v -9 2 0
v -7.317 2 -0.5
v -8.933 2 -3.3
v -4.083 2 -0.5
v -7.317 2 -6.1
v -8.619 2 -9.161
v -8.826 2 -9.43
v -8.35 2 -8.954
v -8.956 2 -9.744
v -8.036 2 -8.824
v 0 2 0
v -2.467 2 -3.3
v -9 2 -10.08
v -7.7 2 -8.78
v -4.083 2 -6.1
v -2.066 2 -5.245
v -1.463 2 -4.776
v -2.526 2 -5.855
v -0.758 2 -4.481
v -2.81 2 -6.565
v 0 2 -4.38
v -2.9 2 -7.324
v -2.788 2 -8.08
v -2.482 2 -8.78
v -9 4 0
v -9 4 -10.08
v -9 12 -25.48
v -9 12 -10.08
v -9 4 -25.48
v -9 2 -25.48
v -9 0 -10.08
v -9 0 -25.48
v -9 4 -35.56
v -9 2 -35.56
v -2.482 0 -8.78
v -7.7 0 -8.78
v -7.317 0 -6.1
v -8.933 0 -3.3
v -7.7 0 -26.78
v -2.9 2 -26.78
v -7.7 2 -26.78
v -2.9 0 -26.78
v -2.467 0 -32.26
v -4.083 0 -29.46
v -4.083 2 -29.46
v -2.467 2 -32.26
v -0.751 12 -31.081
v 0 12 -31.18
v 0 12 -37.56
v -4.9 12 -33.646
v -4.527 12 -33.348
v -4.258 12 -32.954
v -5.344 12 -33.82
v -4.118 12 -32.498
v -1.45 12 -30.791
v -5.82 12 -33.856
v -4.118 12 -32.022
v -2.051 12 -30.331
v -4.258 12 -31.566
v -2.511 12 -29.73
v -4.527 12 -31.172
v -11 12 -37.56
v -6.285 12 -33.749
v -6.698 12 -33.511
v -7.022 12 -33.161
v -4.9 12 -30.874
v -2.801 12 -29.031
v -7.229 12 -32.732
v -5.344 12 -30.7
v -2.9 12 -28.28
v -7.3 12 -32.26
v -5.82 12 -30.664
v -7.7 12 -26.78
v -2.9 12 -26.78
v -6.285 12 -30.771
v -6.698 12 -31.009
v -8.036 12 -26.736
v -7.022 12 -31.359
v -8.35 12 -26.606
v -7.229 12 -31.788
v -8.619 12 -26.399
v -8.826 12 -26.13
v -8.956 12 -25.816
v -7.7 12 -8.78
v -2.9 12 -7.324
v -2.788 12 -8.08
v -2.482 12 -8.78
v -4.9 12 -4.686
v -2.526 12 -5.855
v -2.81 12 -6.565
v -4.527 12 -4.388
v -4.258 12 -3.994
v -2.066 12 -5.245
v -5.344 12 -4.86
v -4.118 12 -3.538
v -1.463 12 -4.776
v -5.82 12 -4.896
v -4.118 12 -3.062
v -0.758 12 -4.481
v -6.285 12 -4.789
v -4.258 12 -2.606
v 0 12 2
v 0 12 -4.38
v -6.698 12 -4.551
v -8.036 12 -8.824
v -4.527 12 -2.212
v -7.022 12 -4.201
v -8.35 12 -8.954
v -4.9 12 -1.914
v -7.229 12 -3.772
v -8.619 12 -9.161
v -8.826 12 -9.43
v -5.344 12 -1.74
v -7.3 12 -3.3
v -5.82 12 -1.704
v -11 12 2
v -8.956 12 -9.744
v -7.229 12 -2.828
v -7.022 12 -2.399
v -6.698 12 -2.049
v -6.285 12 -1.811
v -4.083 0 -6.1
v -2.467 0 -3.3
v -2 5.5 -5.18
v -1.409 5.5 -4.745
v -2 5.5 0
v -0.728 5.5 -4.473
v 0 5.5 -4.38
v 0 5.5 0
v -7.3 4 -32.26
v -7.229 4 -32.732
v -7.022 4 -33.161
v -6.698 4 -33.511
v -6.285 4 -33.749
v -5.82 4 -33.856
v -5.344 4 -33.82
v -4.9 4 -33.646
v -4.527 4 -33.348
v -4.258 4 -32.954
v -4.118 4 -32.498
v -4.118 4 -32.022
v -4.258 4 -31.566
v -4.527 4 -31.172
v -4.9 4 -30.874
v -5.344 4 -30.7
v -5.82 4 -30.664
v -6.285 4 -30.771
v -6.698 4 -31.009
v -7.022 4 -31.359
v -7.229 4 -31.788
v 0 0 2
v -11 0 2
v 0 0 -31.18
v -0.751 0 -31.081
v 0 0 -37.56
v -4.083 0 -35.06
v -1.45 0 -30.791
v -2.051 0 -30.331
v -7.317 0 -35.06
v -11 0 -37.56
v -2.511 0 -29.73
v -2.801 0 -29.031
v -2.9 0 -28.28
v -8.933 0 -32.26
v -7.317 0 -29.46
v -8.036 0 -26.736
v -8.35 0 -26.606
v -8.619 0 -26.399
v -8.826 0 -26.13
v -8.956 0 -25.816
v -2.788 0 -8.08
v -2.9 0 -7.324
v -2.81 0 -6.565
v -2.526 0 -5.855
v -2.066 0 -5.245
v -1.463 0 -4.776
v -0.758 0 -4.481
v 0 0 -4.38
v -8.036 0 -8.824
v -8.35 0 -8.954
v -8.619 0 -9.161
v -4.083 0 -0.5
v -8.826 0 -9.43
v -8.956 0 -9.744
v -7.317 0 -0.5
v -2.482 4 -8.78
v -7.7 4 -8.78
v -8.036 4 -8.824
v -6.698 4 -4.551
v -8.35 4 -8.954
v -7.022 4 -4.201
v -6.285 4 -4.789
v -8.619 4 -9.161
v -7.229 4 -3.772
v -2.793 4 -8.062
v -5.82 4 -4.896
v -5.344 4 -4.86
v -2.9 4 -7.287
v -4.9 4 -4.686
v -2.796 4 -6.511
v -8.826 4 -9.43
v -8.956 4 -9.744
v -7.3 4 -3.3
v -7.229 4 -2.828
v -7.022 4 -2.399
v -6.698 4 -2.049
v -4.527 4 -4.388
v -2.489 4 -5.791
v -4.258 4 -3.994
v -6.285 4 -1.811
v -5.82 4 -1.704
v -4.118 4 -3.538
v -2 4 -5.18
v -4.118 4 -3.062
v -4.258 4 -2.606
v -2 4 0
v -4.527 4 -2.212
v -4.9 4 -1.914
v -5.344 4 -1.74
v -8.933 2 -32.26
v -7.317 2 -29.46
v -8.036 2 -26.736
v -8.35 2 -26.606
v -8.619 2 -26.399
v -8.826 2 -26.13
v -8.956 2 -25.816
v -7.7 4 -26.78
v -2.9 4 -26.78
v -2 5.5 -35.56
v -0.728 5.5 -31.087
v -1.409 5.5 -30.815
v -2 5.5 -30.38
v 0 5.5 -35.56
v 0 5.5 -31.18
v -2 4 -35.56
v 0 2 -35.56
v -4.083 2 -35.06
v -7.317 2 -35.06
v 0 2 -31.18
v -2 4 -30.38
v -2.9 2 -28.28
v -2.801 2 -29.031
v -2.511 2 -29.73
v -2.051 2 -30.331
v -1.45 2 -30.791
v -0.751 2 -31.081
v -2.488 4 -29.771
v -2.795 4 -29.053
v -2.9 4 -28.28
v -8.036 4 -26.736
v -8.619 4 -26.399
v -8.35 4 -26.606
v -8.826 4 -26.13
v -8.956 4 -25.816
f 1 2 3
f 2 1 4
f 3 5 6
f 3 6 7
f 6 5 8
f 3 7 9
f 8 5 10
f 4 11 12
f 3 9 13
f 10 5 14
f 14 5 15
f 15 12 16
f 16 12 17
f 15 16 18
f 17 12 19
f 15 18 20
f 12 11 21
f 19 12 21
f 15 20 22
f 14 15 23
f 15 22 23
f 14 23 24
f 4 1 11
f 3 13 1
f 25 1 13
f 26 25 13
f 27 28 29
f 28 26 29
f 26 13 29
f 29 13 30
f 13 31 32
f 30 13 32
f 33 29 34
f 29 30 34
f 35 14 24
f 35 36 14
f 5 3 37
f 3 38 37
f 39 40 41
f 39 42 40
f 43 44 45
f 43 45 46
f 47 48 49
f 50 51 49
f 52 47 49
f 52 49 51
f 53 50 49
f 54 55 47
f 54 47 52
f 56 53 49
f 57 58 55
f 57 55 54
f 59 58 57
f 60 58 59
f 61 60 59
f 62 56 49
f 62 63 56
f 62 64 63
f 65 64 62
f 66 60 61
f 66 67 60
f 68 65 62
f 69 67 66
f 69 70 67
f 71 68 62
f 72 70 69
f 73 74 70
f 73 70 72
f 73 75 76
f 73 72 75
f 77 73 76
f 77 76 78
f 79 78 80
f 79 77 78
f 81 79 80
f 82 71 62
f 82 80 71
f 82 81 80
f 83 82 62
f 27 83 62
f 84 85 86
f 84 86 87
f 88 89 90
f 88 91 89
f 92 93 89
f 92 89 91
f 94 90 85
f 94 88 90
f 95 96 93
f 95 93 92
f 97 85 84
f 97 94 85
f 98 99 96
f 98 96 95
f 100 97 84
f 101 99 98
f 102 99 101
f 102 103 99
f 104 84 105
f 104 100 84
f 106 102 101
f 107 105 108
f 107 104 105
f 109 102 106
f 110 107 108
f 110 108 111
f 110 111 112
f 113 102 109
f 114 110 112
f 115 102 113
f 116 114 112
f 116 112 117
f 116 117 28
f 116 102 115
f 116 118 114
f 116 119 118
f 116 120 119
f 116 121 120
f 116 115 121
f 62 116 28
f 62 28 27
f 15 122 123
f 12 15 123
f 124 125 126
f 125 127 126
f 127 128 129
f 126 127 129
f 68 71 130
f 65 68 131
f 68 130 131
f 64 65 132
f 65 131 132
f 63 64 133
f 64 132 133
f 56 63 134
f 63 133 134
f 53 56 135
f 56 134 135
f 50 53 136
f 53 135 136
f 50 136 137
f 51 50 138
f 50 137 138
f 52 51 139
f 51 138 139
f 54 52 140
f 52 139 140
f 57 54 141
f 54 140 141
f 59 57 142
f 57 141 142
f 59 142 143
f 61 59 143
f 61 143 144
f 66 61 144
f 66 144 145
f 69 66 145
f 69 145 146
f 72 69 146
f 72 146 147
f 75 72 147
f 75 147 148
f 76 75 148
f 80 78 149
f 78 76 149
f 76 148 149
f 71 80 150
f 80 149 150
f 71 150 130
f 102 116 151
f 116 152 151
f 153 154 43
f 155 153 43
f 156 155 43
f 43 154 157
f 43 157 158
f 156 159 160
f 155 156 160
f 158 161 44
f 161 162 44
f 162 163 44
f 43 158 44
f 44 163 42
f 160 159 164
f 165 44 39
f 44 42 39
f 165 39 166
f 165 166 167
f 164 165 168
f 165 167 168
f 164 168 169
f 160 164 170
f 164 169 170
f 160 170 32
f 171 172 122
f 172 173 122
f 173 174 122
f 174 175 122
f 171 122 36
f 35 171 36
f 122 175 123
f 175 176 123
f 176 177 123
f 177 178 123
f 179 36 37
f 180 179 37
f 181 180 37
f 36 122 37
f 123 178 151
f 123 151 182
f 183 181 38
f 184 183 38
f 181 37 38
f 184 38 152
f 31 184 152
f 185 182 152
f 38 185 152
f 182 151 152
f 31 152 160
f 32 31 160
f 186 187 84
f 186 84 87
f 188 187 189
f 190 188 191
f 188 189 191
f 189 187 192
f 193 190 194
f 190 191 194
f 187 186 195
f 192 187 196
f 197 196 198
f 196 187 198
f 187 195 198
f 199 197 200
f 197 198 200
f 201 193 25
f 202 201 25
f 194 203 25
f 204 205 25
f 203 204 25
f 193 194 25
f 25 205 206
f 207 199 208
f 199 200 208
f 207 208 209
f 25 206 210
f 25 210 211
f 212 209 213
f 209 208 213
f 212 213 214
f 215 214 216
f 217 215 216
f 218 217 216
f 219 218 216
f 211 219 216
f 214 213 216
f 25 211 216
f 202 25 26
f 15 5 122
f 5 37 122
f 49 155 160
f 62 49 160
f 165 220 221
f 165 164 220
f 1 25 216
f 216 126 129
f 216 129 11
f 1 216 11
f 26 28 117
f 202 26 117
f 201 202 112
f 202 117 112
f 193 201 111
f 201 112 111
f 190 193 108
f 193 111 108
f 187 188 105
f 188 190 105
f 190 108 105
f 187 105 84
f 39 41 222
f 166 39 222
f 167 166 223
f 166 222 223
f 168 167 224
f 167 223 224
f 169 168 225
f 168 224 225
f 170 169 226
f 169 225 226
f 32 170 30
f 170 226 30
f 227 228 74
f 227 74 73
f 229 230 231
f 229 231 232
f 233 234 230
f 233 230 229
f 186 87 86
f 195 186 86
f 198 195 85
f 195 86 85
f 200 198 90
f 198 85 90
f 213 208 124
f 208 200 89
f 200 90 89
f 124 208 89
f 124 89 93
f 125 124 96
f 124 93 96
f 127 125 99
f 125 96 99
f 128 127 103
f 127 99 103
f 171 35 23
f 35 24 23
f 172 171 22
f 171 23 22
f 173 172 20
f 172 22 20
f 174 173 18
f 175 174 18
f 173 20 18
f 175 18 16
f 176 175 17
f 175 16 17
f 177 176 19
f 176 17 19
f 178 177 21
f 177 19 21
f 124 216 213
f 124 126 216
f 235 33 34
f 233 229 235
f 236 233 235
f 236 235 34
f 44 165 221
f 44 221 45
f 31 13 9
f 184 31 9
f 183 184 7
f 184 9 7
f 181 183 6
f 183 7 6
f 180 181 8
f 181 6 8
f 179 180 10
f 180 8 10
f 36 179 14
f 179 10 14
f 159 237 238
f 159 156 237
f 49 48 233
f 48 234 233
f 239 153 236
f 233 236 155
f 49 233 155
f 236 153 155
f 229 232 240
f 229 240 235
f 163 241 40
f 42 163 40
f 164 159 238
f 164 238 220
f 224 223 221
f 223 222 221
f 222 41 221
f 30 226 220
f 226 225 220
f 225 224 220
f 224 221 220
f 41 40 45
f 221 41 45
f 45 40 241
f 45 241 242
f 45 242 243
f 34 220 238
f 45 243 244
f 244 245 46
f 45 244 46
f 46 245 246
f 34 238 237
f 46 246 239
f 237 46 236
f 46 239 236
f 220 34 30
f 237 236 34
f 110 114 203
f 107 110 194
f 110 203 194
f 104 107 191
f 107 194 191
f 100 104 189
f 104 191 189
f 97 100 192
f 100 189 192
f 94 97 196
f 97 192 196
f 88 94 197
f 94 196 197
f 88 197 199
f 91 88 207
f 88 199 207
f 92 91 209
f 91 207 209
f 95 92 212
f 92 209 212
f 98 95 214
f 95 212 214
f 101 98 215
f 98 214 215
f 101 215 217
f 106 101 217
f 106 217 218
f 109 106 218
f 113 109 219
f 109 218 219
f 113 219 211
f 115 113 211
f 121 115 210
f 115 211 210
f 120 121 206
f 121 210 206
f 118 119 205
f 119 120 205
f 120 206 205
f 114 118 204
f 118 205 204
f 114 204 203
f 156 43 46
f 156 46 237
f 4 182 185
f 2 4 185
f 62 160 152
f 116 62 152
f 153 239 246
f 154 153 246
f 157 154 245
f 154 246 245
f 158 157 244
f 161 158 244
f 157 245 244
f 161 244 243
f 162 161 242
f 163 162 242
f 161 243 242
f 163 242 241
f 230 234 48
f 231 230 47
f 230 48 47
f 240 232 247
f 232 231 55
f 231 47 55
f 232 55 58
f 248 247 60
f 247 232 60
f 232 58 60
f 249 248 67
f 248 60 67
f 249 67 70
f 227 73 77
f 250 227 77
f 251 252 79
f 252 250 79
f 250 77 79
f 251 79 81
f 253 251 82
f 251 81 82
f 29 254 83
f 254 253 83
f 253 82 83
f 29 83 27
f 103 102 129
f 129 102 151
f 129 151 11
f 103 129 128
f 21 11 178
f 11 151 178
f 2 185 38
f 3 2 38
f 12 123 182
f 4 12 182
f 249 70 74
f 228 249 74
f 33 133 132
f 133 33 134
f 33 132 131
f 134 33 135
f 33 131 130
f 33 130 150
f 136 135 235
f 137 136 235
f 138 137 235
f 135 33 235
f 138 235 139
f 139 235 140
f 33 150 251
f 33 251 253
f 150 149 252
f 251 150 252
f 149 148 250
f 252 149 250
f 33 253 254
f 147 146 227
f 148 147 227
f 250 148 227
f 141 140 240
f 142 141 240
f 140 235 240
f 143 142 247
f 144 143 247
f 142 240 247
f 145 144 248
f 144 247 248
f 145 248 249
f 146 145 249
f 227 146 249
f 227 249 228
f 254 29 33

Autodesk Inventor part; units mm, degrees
ref_plane "YZ Plane" through (0, 0, 0) normal (1, 0, 0) x (0, 1, 0)
ref_plane "XZ Plane" through (0, 0, 0) normal (0, 1, 0) x (-1, 0, 0)
ref_plane "XY Plane" through (0, 0, 0) normal (0, 0, 1) x (1, 0, 0)
sketch "Эскиз1" plane through (0, 0, 0) normal (0, 1, 0) x (-1, 0, 0)
  line L0 (0, 0) -> (9, 0)
  line L1 (9, 0) -> (9, -35.56)
  line L2 (9, -35.56) -> (0, -35.56)
  line L3 (0, -35.56) -> (0, 0)
  line L4 (-8.5, -9.28) -> (7.5, -9.28)
  line L5 (8.5, -10.28) -> (8.5, -25.28)
  line L6 (7.5, -26.28) -> (-8.5, -26.28)
  line L7 (-8.5, -26.28) -> (-8.5, -9.28)
  line L8 (-8.5, -9.28) -> (8.5, -26.28) construction
  line L9 (8.5, -9.28) -> (-8.5, -26.28) construction
  circle A0 centre (7.5, -10.28) radius 1
  circle A1 centre (7.5, -25.28) radius 1
  line L10 (7.5, -9.28) -> (8.5, -9.28) construction
  line L11 (8.5, -10.28) -> (8.5, -9.28) construction
  line L12 (7.5, -26.28) -> (8.5, -26.28) construction
  line L13 (8.5, -26.28) -> (8.5, -25.28) construction
  line L14 (9, -25.28) -> (9, -10.28)
  line L15 (9, -10.28) -> (9, -8.78)
  line L16 (9, -8.78) -> (7.5, -8.78)
  line L17 (7.5, -8.78) -> (-9, -8.78)
  line L18 (-9, -8.78) -> (-9, -26.78)
  line L19 (-9, -26.78) -> (7.5, -26.78)
  line L20 (7.5, -26.78) -> (9, -26.78)
  line L21 (9, -26.78) -> (9, -25.28)
  line L22 (11, 2) -> (-2, 2)
  line L23 (-2, 2) -> (-2, -37.56)
  line L24 (-2, -37.56) -> (11, -37.56)
  line L25 (11, -37.56) -> (11, 2)
  line L26 (0, 2) -> (0, 0)
  line L27 (0, -35.56) -> (0, -37.56)
  circle A2 centre (5.7, -32.26) radius 1.6
  line L28 (0, -17.78) -> (11, -17.78) construction
  circle A3 centre (5.7, -3.3) radius 1.6
  point P0 (0, -26.78)
  point P1 (0, -8.78)
  dimension "d0" = 17
  dimension "d1" = 17
  dimension "d2" = 35.56
  dimension "d3" = 2
  dimension "d4" = 90
  dimension "d5" = 0.5
  dimension "d6" = 2
  dimension "d7" = 3.2
  dimension "d8" = 3.3
  dimension "d9" = 3.3
extrude "Выдавливание1" add sketch "Эскиз1" along normal blind 12 contours L26 L22 L25 L24 L27 L2 L1 L0 | L0 L1 L16 L17 L3 | L19 L20 L1 L2 L3
sketch "Эскиз2" plane through (0, 0, 0) normal (0, -1, 0) x (1, 0, 0)
  circle A0 centre (-5.7, -32.26) radius 1.6 projected
  line L0 (-2.4668, -32.26) -> (-4.0834, -35.06)
  line L1 (-4.0834, -35.06) -> (-7.3166, -35.06)
  line L2 (-7.3166, -35.06) -> (-8.9332, -32.26)
  line L3 (-8.9332, -32.26) -> (-7.3166, -29.46)
  line L4 (-7.3166, -29.46) -> (-4.0834, -29.46)
  line L5 (-4.0834, -29.46) -> (-2.4668, -32.26)
  line L6 (-11, -37.56) -> (-11, 2) projected
  line L7 (-11, -17.78) -> (0, -17.78) construction
  circle A1 centre (-5.7, -3.3) radius 1.6
  line L8 (-2.4668, -3.3) -> (-4.0834, -0.5)
  line L9 (-4.0834, -0.5) -> (-7.3166, -0.5)
  line L10 (-7.3166, -0.5) -> (-8.9332, -3.3)
  line L11 (-8.9332, -3.3) -> (-7.3166, -6.1)
  line L12 (-7.3166, -6.1) -> (-4.0834, -6.1)
  line L13 (-4.0834, -6.1) -> (-2.4668, -3.3)
  point P0 (0, 0)
  dimension "d12" = 5.6
extrude "Выдавливание2" cut sketch "Эскиз2" against normal blind 2 contours L0 L1 L2 L3 L4 L5 | A1 | L13 L12 L11 L10 L9 L8
sketch "Эскиз3" plane through (0, 0, -26.78) normal (1, 0, 0) x (0, 0, -1)
  line L0 (-28.78, 0) -> (-28.78, 12) projected
  line L1 (10.78, 0) -> (-28.78, 0)
  line L2 (-28.78, 0) -> (-28.78, 12)
  line L3 (-28.78, 12) -> (10.78, 12)
  line L4 (10.78, 12) -> (10.78, 0)
  line L5 (8.78, 10) -> (-26.78, 10)
  line L6 (-26.78, 10) -> (-26.78, 2)
  line L7 (-26.78, 2) -> (8.78, 2)
  line L8 (8.78, 2) -> (8.78, 10)
  line L9 (10.78, 0) -> (10.78, 12) projected
  line L10 (-28.78, 0) -> (-18, 0) projected
  line L11 (8.78, 4) -> (-26.78, 4)
  point P0 (-26.78, 0)
  dimension "d15" = 2
  dimension "d16" = 2
extrude "Выдавливание3" cut sketch "Эскиз3" against normal up to surface (9 mm away) contours L8 L7 L6 L11
fillet "Сопряжение1" radius 1.3 4 edges at (-9, 1, -8.78) (-9, 8, -8.78) (-9, 1, -26.78) (-9, 8, -26.78)
sketch "Эскиз4" plane through (0, 12, 0) normal (0, 1, 0) x (1, 0, 0)
  line L0 (-7.7, 26.78) -> (0, 26.78) projected
  line L1 (-2.4, 26.78) -> (2.4, 26.78)
  line L2 (2.4, 26.78) -> (2.4, 28.28)
  line L3 (2.4, 28.28) -> (-2.4, 28.28)
  line L4 (-2.4, 28.28) -> (-2.4, 26.78)
  line L5 (0, 26.78) -> (-2.4, 28.28) construction
  line L6 (2.4, 28.28) -> (0, 26.78) construction
  line L7 (0, 26.78) -> (0, 37.56) projected
  circle A0 centre (0, 28.28) radius 2.4
  line L8 (0, 17.78) -> (-11, 17.78) construction
  line L9 (-11, 37.56) -> (-11, -2) projected
  line L10 (-2.4, 8.78) -> (2.4, 8.78)
  line L11 (2.4, 8.78) -> (2.4, 7.28)
  line L12 (2.4, 7.28) -> (-2.4, 7.28)
  line L13 (-2.4, 7.28) -> (-2.4, 8.78)
  line L14 (0, 8.78) -> (-2.4, 7.28) construction
  line L15 (2.4, 7.28) -> (0, 8.78) construction
  circle A1 centre (0, 7.28) radius 2.4
  line L16 (-11, -2) -> (0, 17.78) construction
  line L17 (0, 37.56) -> (-11, 37.56) projected
  line L18 (0, 17.78) -> (-11, 37.56) construction
  line L19 (-2.9, 26.28) -> (2.9, 26.28)
  line L20 (2.9, 26.28) -> (2.9, 28.78)
  line L21 (2.9, 28.78) -> (-2.9, 28.78)
  line L22 (-2.9, 28.78) -> (-2.9, 26.28)
  circle A2 centre (0, 28.28) radius 2.9
  circle A3 centre (0, 7.28) radius 2.9
  line L23 (2.9, 6.78) -> (2.9, 9.28)
  line L24 (2.9, 9.28) -> (-2.9, 9.28)
  line L25 (-2.9, 9.28) -> (-2.9, 6.78)
  line L26 (-2.9, 6.78) -> (2.9, 6.78)
  point P0 (0, 0)
  point P1 (-2.9, 28.28)
  point P2 (-2.9, 26.78)
  point P3 (0, 31.18)
  point P4 (1.8735, 8.78)
  point P5 (1.8735, 8.78)
  point P6 (-1.8735, 8.78)
  point P7 (-1.8735, 8.78)
  point P8 (-1.9, 8.7463)
  point P9 (-2.1, 9.28)
  point P10 (-2.9, 7.28)
  dimension "d20" = 4.8
  dimension "d21" = 1.5
  dimension "d22" = 0.5
  dimension "d23" = 0.5
extrude "Выдавливание4" cut sketch "Эскиз4" against normal up to surface (12 mm away) contours L22 A2 L0 | A2 L21 A0 L4 L0 | L4 A0 L0 | A2 L7 A0 L21 | A0 L3 L7 L0 | A0 L21 L7 L3 | A0 L7 L21 | L13 A1 L26 A3 L24 L10 | L10 A1 L13 | A1 L24 L10 | L10 A1 L12 | L12 A1 L26 | A1 L24 A3 L26 L11 L10 | L10 L11 A1 | L24 A3 A1 | A1 L24 | L26 A1 | A1 L26 A3 picked at (-0.403, 30.9667) picked at (-0.7824, 28.6133) picked at (-1.5074, 28.9517)
sketch "Эскиз5" plane through (0, 0, 2) normal (1, 0, 0) x (0, 0, -1)
  line L0 (10.78, 12) -> (10.78, 4) projected
  line L1 (2, 2) -> (2, 4) projected
  line L2 (2, 4) -> (10.78, 4)
  line L3 (10.78, 4) -> (10.78, 5.5)
  line L4 (10.78, 5.5) -> (2, 5.5)
  line L5 (2, 5.5) -> (2, 4)
  line L6 (30.28, 12) -> (30.28, 4) projected
  line L7 (37.56, 4) -> (37.56, 2) projected
  line L8 (33.18, 4) -> (37.56, 4) projected
  line L9 (37.56, 4) -> (30.28, 4)
  line L10 (30.28, 4) -> (30.28, 5.5)
  line L11 (30.28, 5.5) -> (37.56, 5.5)
  line L12 (37.56, 5.5) -> (37.56, 4)
  point P0 (2, 0)
  point P1 (10.78, 4)
  dimension "d26" = 1.5
extrude "Выдавливание5" cut sketch "Эскиз5" against normal blind 2
properties part number "krepl_1.2"
